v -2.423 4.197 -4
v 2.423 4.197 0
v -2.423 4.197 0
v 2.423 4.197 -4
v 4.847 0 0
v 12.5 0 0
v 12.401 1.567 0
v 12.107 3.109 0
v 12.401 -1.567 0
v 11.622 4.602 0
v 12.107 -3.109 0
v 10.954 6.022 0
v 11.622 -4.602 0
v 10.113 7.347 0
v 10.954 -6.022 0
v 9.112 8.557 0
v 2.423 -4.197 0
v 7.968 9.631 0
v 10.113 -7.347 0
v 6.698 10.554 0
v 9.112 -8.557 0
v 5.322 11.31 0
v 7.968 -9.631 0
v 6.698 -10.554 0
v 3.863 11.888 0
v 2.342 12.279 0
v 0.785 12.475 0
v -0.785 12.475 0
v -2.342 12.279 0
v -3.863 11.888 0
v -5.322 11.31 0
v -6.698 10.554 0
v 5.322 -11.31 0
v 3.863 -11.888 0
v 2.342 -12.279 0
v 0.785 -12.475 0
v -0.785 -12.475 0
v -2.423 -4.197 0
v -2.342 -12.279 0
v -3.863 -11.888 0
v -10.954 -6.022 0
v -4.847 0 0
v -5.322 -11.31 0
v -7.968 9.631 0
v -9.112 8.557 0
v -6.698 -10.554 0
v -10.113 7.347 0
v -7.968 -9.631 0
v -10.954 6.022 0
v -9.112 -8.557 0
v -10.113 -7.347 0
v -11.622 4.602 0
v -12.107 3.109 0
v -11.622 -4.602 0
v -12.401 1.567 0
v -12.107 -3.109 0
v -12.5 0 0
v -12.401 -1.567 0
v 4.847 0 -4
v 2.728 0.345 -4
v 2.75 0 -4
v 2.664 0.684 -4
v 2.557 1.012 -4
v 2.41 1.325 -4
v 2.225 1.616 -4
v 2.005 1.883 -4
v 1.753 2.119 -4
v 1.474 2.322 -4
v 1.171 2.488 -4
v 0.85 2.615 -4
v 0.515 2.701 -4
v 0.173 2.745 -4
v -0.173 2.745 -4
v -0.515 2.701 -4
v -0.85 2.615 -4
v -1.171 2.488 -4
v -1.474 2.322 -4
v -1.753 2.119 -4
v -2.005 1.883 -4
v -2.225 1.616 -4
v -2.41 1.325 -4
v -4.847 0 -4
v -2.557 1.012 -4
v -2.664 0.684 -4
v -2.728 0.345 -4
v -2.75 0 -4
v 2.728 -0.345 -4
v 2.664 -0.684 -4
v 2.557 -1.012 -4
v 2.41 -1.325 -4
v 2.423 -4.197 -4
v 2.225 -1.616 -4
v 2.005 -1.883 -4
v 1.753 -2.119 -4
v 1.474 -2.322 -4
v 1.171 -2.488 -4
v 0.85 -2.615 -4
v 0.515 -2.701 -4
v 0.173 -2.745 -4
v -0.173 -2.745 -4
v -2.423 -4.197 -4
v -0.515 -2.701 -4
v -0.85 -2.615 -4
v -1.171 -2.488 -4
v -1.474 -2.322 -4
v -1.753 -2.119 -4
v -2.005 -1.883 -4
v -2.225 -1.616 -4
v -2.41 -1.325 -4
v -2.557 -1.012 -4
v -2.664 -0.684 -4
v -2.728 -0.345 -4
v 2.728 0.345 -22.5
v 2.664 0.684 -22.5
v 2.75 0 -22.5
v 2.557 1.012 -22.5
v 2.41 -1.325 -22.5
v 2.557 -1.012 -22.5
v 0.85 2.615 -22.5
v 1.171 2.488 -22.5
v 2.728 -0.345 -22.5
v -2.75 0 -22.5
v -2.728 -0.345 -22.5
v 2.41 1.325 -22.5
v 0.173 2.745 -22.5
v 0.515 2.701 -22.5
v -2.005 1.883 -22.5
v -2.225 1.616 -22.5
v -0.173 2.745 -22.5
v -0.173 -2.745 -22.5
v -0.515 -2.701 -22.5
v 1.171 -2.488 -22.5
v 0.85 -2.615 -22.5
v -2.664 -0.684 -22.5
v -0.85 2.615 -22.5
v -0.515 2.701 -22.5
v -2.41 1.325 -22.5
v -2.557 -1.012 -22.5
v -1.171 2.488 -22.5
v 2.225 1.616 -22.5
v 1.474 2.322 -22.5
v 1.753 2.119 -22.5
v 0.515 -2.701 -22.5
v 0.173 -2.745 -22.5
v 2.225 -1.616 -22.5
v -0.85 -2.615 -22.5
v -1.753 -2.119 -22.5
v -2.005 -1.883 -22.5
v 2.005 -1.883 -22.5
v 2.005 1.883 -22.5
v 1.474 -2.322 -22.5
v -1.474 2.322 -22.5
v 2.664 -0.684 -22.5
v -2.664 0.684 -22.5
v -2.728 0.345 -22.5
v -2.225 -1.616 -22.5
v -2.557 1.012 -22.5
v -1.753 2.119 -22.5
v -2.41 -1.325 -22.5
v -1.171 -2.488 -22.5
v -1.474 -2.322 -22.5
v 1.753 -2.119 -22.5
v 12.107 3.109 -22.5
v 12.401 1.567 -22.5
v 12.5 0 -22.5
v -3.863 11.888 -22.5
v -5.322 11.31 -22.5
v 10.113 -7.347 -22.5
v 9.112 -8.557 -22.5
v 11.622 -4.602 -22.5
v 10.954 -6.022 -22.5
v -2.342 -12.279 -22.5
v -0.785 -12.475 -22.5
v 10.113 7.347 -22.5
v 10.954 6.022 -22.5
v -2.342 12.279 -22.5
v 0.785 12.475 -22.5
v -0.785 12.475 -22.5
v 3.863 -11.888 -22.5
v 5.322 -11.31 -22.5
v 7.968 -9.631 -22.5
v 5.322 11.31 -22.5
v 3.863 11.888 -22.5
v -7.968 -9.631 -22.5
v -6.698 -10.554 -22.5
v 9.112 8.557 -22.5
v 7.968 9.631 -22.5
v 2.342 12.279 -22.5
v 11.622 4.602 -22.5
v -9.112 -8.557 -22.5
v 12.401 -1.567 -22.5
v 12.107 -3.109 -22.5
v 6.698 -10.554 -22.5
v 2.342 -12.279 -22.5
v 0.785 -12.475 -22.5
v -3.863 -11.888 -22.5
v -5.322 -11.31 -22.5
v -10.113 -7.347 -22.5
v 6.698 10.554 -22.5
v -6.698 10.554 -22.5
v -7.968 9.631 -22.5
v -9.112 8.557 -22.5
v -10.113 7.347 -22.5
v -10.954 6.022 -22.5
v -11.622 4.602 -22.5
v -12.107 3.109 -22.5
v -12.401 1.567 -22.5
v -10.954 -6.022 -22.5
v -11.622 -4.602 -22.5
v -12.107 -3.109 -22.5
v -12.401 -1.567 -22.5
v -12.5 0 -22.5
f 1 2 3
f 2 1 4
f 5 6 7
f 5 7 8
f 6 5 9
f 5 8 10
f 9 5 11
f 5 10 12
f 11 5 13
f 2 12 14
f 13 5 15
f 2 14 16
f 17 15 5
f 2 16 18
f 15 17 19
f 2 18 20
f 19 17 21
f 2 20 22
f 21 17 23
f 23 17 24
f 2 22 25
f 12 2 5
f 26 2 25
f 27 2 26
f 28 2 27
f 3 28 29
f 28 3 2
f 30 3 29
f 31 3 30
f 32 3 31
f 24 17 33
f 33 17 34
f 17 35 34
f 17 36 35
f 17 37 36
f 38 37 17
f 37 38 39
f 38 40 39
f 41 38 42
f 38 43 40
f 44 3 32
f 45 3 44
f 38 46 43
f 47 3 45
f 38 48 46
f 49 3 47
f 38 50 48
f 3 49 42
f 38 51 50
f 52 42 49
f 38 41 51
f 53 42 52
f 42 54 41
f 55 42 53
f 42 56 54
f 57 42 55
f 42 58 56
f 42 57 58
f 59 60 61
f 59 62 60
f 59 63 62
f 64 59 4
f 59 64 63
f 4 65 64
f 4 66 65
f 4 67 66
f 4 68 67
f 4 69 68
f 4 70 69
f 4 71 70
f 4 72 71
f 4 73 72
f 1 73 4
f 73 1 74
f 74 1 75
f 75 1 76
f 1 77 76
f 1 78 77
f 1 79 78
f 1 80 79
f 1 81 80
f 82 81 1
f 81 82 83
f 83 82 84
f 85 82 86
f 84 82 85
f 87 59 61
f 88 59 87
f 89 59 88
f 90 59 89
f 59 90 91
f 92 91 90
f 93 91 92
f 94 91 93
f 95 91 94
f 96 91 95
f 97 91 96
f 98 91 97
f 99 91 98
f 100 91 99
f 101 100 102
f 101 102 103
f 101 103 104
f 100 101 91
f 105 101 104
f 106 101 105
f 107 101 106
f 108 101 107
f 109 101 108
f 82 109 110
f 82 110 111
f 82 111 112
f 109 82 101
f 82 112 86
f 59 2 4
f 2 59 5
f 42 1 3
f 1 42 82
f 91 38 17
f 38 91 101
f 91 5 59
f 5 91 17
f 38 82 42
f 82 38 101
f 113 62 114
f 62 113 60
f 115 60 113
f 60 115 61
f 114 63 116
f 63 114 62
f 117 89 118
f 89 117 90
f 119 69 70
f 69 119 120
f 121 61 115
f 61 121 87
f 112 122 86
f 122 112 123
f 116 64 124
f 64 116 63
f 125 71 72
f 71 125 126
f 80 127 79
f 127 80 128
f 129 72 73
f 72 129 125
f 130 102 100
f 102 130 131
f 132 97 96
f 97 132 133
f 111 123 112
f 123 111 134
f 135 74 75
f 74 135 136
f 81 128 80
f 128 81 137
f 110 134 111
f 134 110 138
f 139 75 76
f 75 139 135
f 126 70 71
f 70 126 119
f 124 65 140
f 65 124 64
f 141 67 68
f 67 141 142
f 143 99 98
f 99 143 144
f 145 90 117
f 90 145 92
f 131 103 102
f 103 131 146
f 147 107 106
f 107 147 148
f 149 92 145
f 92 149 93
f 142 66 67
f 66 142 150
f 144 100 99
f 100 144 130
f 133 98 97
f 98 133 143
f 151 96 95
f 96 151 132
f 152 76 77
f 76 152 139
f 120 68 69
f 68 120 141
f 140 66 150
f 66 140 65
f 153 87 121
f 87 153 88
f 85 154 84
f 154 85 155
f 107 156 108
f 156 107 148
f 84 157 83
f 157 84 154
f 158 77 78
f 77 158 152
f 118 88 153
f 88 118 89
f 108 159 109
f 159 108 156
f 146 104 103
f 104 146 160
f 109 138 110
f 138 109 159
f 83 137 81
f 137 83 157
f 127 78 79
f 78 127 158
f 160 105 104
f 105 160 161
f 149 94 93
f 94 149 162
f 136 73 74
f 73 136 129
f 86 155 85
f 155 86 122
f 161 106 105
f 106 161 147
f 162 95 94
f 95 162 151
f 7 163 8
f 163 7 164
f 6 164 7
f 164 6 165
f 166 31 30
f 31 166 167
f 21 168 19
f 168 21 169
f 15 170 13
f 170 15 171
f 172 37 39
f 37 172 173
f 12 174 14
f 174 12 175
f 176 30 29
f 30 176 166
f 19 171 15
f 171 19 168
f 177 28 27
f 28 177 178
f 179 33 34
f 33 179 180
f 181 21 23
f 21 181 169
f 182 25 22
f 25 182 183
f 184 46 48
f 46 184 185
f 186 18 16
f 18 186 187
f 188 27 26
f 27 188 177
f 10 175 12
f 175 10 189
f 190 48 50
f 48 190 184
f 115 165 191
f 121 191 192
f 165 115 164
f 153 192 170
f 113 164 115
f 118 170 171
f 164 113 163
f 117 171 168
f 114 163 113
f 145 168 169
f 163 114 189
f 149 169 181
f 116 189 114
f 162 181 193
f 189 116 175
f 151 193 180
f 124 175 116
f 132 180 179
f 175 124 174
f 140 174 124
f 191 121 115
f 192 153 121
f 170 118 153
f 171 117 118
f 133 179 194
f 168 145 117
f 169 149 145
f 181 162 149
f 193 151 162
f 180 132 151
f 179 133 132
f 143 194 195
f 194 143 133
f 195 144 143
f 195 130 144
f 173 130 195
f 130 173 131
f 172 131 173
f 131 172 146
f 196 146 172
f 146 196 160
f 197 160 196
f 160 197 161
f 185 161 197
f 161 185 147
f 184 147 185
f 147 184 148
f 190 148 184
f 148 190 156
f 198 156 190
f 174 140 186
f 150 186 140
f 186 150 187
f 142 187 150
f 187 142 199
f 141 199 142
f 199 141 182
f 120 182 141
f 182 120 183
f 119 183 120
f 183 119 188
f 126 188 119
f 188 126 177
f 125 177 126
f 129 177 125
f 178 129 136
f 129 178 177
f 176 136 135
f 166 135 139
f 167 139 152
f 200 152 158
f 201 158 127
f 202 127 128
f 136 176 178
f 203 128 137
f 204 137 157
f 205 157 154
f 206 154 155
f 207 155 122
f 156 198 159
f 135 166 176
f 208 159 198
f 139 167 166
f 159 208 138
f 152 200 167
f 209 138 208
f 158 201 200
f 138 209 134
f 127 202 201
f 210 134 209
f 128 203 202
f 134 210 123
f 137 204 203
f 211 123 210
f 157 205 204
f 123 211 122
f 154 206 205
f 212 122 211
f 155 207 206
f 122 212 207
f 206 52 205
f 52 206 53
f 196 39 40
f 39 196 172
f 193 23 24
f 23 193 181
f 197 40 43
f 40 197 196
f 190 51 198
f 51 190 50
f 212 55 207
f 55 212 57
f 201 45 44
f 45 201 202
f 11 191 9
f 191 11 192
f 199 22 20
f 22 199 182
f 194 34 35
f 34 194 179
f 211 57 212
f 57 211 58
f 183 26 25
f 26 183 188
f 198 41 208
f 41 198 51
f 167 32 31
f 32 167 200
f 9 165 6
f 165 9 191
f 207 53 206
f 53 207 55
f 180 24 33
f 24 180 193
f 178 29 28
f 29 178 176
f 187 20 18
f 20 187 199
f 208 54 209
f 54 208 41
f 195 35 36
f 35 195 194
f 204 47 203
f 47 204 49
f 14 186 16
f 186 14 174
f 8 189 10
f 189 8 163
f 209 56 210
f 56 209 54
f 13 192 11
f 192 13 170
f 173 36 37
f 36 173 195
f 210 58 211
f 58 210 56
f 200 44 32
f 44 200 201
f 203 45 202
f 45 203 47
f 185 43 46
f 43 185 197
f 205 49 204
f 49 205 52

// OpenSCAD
$fn = 50;

difference() {
	union() {
		translate(v = [0, 0, -22.5]) {
			cylinder(h = 22.5, r = 12.5);
		}
	}
	union() {
		translate(v = [0, 0, 0]) {
			rotate(a = [0, 0, 0]) {
				difference() {
					union() {
						translate(v = [0, 0, -4]) {
							linear_extrude(height = 4) {
								polygon(points = [[4.8468, 0.0], [2.4234000000000004, 4.197451927062417], [-2.423399999999999, 4.197451927062417], [-4.8468, 5.935618106107392e-16], [-2.423400000000002, -4.197451927062416], [2.423399999999997, -4.197451927062419]]);
							}
						}
					}
					union();
				}
			}
		}
		#translate(v = [0, 0, -100.0]) {
			cylinder(h = 200, r = 2.75);
		}
	}
}
